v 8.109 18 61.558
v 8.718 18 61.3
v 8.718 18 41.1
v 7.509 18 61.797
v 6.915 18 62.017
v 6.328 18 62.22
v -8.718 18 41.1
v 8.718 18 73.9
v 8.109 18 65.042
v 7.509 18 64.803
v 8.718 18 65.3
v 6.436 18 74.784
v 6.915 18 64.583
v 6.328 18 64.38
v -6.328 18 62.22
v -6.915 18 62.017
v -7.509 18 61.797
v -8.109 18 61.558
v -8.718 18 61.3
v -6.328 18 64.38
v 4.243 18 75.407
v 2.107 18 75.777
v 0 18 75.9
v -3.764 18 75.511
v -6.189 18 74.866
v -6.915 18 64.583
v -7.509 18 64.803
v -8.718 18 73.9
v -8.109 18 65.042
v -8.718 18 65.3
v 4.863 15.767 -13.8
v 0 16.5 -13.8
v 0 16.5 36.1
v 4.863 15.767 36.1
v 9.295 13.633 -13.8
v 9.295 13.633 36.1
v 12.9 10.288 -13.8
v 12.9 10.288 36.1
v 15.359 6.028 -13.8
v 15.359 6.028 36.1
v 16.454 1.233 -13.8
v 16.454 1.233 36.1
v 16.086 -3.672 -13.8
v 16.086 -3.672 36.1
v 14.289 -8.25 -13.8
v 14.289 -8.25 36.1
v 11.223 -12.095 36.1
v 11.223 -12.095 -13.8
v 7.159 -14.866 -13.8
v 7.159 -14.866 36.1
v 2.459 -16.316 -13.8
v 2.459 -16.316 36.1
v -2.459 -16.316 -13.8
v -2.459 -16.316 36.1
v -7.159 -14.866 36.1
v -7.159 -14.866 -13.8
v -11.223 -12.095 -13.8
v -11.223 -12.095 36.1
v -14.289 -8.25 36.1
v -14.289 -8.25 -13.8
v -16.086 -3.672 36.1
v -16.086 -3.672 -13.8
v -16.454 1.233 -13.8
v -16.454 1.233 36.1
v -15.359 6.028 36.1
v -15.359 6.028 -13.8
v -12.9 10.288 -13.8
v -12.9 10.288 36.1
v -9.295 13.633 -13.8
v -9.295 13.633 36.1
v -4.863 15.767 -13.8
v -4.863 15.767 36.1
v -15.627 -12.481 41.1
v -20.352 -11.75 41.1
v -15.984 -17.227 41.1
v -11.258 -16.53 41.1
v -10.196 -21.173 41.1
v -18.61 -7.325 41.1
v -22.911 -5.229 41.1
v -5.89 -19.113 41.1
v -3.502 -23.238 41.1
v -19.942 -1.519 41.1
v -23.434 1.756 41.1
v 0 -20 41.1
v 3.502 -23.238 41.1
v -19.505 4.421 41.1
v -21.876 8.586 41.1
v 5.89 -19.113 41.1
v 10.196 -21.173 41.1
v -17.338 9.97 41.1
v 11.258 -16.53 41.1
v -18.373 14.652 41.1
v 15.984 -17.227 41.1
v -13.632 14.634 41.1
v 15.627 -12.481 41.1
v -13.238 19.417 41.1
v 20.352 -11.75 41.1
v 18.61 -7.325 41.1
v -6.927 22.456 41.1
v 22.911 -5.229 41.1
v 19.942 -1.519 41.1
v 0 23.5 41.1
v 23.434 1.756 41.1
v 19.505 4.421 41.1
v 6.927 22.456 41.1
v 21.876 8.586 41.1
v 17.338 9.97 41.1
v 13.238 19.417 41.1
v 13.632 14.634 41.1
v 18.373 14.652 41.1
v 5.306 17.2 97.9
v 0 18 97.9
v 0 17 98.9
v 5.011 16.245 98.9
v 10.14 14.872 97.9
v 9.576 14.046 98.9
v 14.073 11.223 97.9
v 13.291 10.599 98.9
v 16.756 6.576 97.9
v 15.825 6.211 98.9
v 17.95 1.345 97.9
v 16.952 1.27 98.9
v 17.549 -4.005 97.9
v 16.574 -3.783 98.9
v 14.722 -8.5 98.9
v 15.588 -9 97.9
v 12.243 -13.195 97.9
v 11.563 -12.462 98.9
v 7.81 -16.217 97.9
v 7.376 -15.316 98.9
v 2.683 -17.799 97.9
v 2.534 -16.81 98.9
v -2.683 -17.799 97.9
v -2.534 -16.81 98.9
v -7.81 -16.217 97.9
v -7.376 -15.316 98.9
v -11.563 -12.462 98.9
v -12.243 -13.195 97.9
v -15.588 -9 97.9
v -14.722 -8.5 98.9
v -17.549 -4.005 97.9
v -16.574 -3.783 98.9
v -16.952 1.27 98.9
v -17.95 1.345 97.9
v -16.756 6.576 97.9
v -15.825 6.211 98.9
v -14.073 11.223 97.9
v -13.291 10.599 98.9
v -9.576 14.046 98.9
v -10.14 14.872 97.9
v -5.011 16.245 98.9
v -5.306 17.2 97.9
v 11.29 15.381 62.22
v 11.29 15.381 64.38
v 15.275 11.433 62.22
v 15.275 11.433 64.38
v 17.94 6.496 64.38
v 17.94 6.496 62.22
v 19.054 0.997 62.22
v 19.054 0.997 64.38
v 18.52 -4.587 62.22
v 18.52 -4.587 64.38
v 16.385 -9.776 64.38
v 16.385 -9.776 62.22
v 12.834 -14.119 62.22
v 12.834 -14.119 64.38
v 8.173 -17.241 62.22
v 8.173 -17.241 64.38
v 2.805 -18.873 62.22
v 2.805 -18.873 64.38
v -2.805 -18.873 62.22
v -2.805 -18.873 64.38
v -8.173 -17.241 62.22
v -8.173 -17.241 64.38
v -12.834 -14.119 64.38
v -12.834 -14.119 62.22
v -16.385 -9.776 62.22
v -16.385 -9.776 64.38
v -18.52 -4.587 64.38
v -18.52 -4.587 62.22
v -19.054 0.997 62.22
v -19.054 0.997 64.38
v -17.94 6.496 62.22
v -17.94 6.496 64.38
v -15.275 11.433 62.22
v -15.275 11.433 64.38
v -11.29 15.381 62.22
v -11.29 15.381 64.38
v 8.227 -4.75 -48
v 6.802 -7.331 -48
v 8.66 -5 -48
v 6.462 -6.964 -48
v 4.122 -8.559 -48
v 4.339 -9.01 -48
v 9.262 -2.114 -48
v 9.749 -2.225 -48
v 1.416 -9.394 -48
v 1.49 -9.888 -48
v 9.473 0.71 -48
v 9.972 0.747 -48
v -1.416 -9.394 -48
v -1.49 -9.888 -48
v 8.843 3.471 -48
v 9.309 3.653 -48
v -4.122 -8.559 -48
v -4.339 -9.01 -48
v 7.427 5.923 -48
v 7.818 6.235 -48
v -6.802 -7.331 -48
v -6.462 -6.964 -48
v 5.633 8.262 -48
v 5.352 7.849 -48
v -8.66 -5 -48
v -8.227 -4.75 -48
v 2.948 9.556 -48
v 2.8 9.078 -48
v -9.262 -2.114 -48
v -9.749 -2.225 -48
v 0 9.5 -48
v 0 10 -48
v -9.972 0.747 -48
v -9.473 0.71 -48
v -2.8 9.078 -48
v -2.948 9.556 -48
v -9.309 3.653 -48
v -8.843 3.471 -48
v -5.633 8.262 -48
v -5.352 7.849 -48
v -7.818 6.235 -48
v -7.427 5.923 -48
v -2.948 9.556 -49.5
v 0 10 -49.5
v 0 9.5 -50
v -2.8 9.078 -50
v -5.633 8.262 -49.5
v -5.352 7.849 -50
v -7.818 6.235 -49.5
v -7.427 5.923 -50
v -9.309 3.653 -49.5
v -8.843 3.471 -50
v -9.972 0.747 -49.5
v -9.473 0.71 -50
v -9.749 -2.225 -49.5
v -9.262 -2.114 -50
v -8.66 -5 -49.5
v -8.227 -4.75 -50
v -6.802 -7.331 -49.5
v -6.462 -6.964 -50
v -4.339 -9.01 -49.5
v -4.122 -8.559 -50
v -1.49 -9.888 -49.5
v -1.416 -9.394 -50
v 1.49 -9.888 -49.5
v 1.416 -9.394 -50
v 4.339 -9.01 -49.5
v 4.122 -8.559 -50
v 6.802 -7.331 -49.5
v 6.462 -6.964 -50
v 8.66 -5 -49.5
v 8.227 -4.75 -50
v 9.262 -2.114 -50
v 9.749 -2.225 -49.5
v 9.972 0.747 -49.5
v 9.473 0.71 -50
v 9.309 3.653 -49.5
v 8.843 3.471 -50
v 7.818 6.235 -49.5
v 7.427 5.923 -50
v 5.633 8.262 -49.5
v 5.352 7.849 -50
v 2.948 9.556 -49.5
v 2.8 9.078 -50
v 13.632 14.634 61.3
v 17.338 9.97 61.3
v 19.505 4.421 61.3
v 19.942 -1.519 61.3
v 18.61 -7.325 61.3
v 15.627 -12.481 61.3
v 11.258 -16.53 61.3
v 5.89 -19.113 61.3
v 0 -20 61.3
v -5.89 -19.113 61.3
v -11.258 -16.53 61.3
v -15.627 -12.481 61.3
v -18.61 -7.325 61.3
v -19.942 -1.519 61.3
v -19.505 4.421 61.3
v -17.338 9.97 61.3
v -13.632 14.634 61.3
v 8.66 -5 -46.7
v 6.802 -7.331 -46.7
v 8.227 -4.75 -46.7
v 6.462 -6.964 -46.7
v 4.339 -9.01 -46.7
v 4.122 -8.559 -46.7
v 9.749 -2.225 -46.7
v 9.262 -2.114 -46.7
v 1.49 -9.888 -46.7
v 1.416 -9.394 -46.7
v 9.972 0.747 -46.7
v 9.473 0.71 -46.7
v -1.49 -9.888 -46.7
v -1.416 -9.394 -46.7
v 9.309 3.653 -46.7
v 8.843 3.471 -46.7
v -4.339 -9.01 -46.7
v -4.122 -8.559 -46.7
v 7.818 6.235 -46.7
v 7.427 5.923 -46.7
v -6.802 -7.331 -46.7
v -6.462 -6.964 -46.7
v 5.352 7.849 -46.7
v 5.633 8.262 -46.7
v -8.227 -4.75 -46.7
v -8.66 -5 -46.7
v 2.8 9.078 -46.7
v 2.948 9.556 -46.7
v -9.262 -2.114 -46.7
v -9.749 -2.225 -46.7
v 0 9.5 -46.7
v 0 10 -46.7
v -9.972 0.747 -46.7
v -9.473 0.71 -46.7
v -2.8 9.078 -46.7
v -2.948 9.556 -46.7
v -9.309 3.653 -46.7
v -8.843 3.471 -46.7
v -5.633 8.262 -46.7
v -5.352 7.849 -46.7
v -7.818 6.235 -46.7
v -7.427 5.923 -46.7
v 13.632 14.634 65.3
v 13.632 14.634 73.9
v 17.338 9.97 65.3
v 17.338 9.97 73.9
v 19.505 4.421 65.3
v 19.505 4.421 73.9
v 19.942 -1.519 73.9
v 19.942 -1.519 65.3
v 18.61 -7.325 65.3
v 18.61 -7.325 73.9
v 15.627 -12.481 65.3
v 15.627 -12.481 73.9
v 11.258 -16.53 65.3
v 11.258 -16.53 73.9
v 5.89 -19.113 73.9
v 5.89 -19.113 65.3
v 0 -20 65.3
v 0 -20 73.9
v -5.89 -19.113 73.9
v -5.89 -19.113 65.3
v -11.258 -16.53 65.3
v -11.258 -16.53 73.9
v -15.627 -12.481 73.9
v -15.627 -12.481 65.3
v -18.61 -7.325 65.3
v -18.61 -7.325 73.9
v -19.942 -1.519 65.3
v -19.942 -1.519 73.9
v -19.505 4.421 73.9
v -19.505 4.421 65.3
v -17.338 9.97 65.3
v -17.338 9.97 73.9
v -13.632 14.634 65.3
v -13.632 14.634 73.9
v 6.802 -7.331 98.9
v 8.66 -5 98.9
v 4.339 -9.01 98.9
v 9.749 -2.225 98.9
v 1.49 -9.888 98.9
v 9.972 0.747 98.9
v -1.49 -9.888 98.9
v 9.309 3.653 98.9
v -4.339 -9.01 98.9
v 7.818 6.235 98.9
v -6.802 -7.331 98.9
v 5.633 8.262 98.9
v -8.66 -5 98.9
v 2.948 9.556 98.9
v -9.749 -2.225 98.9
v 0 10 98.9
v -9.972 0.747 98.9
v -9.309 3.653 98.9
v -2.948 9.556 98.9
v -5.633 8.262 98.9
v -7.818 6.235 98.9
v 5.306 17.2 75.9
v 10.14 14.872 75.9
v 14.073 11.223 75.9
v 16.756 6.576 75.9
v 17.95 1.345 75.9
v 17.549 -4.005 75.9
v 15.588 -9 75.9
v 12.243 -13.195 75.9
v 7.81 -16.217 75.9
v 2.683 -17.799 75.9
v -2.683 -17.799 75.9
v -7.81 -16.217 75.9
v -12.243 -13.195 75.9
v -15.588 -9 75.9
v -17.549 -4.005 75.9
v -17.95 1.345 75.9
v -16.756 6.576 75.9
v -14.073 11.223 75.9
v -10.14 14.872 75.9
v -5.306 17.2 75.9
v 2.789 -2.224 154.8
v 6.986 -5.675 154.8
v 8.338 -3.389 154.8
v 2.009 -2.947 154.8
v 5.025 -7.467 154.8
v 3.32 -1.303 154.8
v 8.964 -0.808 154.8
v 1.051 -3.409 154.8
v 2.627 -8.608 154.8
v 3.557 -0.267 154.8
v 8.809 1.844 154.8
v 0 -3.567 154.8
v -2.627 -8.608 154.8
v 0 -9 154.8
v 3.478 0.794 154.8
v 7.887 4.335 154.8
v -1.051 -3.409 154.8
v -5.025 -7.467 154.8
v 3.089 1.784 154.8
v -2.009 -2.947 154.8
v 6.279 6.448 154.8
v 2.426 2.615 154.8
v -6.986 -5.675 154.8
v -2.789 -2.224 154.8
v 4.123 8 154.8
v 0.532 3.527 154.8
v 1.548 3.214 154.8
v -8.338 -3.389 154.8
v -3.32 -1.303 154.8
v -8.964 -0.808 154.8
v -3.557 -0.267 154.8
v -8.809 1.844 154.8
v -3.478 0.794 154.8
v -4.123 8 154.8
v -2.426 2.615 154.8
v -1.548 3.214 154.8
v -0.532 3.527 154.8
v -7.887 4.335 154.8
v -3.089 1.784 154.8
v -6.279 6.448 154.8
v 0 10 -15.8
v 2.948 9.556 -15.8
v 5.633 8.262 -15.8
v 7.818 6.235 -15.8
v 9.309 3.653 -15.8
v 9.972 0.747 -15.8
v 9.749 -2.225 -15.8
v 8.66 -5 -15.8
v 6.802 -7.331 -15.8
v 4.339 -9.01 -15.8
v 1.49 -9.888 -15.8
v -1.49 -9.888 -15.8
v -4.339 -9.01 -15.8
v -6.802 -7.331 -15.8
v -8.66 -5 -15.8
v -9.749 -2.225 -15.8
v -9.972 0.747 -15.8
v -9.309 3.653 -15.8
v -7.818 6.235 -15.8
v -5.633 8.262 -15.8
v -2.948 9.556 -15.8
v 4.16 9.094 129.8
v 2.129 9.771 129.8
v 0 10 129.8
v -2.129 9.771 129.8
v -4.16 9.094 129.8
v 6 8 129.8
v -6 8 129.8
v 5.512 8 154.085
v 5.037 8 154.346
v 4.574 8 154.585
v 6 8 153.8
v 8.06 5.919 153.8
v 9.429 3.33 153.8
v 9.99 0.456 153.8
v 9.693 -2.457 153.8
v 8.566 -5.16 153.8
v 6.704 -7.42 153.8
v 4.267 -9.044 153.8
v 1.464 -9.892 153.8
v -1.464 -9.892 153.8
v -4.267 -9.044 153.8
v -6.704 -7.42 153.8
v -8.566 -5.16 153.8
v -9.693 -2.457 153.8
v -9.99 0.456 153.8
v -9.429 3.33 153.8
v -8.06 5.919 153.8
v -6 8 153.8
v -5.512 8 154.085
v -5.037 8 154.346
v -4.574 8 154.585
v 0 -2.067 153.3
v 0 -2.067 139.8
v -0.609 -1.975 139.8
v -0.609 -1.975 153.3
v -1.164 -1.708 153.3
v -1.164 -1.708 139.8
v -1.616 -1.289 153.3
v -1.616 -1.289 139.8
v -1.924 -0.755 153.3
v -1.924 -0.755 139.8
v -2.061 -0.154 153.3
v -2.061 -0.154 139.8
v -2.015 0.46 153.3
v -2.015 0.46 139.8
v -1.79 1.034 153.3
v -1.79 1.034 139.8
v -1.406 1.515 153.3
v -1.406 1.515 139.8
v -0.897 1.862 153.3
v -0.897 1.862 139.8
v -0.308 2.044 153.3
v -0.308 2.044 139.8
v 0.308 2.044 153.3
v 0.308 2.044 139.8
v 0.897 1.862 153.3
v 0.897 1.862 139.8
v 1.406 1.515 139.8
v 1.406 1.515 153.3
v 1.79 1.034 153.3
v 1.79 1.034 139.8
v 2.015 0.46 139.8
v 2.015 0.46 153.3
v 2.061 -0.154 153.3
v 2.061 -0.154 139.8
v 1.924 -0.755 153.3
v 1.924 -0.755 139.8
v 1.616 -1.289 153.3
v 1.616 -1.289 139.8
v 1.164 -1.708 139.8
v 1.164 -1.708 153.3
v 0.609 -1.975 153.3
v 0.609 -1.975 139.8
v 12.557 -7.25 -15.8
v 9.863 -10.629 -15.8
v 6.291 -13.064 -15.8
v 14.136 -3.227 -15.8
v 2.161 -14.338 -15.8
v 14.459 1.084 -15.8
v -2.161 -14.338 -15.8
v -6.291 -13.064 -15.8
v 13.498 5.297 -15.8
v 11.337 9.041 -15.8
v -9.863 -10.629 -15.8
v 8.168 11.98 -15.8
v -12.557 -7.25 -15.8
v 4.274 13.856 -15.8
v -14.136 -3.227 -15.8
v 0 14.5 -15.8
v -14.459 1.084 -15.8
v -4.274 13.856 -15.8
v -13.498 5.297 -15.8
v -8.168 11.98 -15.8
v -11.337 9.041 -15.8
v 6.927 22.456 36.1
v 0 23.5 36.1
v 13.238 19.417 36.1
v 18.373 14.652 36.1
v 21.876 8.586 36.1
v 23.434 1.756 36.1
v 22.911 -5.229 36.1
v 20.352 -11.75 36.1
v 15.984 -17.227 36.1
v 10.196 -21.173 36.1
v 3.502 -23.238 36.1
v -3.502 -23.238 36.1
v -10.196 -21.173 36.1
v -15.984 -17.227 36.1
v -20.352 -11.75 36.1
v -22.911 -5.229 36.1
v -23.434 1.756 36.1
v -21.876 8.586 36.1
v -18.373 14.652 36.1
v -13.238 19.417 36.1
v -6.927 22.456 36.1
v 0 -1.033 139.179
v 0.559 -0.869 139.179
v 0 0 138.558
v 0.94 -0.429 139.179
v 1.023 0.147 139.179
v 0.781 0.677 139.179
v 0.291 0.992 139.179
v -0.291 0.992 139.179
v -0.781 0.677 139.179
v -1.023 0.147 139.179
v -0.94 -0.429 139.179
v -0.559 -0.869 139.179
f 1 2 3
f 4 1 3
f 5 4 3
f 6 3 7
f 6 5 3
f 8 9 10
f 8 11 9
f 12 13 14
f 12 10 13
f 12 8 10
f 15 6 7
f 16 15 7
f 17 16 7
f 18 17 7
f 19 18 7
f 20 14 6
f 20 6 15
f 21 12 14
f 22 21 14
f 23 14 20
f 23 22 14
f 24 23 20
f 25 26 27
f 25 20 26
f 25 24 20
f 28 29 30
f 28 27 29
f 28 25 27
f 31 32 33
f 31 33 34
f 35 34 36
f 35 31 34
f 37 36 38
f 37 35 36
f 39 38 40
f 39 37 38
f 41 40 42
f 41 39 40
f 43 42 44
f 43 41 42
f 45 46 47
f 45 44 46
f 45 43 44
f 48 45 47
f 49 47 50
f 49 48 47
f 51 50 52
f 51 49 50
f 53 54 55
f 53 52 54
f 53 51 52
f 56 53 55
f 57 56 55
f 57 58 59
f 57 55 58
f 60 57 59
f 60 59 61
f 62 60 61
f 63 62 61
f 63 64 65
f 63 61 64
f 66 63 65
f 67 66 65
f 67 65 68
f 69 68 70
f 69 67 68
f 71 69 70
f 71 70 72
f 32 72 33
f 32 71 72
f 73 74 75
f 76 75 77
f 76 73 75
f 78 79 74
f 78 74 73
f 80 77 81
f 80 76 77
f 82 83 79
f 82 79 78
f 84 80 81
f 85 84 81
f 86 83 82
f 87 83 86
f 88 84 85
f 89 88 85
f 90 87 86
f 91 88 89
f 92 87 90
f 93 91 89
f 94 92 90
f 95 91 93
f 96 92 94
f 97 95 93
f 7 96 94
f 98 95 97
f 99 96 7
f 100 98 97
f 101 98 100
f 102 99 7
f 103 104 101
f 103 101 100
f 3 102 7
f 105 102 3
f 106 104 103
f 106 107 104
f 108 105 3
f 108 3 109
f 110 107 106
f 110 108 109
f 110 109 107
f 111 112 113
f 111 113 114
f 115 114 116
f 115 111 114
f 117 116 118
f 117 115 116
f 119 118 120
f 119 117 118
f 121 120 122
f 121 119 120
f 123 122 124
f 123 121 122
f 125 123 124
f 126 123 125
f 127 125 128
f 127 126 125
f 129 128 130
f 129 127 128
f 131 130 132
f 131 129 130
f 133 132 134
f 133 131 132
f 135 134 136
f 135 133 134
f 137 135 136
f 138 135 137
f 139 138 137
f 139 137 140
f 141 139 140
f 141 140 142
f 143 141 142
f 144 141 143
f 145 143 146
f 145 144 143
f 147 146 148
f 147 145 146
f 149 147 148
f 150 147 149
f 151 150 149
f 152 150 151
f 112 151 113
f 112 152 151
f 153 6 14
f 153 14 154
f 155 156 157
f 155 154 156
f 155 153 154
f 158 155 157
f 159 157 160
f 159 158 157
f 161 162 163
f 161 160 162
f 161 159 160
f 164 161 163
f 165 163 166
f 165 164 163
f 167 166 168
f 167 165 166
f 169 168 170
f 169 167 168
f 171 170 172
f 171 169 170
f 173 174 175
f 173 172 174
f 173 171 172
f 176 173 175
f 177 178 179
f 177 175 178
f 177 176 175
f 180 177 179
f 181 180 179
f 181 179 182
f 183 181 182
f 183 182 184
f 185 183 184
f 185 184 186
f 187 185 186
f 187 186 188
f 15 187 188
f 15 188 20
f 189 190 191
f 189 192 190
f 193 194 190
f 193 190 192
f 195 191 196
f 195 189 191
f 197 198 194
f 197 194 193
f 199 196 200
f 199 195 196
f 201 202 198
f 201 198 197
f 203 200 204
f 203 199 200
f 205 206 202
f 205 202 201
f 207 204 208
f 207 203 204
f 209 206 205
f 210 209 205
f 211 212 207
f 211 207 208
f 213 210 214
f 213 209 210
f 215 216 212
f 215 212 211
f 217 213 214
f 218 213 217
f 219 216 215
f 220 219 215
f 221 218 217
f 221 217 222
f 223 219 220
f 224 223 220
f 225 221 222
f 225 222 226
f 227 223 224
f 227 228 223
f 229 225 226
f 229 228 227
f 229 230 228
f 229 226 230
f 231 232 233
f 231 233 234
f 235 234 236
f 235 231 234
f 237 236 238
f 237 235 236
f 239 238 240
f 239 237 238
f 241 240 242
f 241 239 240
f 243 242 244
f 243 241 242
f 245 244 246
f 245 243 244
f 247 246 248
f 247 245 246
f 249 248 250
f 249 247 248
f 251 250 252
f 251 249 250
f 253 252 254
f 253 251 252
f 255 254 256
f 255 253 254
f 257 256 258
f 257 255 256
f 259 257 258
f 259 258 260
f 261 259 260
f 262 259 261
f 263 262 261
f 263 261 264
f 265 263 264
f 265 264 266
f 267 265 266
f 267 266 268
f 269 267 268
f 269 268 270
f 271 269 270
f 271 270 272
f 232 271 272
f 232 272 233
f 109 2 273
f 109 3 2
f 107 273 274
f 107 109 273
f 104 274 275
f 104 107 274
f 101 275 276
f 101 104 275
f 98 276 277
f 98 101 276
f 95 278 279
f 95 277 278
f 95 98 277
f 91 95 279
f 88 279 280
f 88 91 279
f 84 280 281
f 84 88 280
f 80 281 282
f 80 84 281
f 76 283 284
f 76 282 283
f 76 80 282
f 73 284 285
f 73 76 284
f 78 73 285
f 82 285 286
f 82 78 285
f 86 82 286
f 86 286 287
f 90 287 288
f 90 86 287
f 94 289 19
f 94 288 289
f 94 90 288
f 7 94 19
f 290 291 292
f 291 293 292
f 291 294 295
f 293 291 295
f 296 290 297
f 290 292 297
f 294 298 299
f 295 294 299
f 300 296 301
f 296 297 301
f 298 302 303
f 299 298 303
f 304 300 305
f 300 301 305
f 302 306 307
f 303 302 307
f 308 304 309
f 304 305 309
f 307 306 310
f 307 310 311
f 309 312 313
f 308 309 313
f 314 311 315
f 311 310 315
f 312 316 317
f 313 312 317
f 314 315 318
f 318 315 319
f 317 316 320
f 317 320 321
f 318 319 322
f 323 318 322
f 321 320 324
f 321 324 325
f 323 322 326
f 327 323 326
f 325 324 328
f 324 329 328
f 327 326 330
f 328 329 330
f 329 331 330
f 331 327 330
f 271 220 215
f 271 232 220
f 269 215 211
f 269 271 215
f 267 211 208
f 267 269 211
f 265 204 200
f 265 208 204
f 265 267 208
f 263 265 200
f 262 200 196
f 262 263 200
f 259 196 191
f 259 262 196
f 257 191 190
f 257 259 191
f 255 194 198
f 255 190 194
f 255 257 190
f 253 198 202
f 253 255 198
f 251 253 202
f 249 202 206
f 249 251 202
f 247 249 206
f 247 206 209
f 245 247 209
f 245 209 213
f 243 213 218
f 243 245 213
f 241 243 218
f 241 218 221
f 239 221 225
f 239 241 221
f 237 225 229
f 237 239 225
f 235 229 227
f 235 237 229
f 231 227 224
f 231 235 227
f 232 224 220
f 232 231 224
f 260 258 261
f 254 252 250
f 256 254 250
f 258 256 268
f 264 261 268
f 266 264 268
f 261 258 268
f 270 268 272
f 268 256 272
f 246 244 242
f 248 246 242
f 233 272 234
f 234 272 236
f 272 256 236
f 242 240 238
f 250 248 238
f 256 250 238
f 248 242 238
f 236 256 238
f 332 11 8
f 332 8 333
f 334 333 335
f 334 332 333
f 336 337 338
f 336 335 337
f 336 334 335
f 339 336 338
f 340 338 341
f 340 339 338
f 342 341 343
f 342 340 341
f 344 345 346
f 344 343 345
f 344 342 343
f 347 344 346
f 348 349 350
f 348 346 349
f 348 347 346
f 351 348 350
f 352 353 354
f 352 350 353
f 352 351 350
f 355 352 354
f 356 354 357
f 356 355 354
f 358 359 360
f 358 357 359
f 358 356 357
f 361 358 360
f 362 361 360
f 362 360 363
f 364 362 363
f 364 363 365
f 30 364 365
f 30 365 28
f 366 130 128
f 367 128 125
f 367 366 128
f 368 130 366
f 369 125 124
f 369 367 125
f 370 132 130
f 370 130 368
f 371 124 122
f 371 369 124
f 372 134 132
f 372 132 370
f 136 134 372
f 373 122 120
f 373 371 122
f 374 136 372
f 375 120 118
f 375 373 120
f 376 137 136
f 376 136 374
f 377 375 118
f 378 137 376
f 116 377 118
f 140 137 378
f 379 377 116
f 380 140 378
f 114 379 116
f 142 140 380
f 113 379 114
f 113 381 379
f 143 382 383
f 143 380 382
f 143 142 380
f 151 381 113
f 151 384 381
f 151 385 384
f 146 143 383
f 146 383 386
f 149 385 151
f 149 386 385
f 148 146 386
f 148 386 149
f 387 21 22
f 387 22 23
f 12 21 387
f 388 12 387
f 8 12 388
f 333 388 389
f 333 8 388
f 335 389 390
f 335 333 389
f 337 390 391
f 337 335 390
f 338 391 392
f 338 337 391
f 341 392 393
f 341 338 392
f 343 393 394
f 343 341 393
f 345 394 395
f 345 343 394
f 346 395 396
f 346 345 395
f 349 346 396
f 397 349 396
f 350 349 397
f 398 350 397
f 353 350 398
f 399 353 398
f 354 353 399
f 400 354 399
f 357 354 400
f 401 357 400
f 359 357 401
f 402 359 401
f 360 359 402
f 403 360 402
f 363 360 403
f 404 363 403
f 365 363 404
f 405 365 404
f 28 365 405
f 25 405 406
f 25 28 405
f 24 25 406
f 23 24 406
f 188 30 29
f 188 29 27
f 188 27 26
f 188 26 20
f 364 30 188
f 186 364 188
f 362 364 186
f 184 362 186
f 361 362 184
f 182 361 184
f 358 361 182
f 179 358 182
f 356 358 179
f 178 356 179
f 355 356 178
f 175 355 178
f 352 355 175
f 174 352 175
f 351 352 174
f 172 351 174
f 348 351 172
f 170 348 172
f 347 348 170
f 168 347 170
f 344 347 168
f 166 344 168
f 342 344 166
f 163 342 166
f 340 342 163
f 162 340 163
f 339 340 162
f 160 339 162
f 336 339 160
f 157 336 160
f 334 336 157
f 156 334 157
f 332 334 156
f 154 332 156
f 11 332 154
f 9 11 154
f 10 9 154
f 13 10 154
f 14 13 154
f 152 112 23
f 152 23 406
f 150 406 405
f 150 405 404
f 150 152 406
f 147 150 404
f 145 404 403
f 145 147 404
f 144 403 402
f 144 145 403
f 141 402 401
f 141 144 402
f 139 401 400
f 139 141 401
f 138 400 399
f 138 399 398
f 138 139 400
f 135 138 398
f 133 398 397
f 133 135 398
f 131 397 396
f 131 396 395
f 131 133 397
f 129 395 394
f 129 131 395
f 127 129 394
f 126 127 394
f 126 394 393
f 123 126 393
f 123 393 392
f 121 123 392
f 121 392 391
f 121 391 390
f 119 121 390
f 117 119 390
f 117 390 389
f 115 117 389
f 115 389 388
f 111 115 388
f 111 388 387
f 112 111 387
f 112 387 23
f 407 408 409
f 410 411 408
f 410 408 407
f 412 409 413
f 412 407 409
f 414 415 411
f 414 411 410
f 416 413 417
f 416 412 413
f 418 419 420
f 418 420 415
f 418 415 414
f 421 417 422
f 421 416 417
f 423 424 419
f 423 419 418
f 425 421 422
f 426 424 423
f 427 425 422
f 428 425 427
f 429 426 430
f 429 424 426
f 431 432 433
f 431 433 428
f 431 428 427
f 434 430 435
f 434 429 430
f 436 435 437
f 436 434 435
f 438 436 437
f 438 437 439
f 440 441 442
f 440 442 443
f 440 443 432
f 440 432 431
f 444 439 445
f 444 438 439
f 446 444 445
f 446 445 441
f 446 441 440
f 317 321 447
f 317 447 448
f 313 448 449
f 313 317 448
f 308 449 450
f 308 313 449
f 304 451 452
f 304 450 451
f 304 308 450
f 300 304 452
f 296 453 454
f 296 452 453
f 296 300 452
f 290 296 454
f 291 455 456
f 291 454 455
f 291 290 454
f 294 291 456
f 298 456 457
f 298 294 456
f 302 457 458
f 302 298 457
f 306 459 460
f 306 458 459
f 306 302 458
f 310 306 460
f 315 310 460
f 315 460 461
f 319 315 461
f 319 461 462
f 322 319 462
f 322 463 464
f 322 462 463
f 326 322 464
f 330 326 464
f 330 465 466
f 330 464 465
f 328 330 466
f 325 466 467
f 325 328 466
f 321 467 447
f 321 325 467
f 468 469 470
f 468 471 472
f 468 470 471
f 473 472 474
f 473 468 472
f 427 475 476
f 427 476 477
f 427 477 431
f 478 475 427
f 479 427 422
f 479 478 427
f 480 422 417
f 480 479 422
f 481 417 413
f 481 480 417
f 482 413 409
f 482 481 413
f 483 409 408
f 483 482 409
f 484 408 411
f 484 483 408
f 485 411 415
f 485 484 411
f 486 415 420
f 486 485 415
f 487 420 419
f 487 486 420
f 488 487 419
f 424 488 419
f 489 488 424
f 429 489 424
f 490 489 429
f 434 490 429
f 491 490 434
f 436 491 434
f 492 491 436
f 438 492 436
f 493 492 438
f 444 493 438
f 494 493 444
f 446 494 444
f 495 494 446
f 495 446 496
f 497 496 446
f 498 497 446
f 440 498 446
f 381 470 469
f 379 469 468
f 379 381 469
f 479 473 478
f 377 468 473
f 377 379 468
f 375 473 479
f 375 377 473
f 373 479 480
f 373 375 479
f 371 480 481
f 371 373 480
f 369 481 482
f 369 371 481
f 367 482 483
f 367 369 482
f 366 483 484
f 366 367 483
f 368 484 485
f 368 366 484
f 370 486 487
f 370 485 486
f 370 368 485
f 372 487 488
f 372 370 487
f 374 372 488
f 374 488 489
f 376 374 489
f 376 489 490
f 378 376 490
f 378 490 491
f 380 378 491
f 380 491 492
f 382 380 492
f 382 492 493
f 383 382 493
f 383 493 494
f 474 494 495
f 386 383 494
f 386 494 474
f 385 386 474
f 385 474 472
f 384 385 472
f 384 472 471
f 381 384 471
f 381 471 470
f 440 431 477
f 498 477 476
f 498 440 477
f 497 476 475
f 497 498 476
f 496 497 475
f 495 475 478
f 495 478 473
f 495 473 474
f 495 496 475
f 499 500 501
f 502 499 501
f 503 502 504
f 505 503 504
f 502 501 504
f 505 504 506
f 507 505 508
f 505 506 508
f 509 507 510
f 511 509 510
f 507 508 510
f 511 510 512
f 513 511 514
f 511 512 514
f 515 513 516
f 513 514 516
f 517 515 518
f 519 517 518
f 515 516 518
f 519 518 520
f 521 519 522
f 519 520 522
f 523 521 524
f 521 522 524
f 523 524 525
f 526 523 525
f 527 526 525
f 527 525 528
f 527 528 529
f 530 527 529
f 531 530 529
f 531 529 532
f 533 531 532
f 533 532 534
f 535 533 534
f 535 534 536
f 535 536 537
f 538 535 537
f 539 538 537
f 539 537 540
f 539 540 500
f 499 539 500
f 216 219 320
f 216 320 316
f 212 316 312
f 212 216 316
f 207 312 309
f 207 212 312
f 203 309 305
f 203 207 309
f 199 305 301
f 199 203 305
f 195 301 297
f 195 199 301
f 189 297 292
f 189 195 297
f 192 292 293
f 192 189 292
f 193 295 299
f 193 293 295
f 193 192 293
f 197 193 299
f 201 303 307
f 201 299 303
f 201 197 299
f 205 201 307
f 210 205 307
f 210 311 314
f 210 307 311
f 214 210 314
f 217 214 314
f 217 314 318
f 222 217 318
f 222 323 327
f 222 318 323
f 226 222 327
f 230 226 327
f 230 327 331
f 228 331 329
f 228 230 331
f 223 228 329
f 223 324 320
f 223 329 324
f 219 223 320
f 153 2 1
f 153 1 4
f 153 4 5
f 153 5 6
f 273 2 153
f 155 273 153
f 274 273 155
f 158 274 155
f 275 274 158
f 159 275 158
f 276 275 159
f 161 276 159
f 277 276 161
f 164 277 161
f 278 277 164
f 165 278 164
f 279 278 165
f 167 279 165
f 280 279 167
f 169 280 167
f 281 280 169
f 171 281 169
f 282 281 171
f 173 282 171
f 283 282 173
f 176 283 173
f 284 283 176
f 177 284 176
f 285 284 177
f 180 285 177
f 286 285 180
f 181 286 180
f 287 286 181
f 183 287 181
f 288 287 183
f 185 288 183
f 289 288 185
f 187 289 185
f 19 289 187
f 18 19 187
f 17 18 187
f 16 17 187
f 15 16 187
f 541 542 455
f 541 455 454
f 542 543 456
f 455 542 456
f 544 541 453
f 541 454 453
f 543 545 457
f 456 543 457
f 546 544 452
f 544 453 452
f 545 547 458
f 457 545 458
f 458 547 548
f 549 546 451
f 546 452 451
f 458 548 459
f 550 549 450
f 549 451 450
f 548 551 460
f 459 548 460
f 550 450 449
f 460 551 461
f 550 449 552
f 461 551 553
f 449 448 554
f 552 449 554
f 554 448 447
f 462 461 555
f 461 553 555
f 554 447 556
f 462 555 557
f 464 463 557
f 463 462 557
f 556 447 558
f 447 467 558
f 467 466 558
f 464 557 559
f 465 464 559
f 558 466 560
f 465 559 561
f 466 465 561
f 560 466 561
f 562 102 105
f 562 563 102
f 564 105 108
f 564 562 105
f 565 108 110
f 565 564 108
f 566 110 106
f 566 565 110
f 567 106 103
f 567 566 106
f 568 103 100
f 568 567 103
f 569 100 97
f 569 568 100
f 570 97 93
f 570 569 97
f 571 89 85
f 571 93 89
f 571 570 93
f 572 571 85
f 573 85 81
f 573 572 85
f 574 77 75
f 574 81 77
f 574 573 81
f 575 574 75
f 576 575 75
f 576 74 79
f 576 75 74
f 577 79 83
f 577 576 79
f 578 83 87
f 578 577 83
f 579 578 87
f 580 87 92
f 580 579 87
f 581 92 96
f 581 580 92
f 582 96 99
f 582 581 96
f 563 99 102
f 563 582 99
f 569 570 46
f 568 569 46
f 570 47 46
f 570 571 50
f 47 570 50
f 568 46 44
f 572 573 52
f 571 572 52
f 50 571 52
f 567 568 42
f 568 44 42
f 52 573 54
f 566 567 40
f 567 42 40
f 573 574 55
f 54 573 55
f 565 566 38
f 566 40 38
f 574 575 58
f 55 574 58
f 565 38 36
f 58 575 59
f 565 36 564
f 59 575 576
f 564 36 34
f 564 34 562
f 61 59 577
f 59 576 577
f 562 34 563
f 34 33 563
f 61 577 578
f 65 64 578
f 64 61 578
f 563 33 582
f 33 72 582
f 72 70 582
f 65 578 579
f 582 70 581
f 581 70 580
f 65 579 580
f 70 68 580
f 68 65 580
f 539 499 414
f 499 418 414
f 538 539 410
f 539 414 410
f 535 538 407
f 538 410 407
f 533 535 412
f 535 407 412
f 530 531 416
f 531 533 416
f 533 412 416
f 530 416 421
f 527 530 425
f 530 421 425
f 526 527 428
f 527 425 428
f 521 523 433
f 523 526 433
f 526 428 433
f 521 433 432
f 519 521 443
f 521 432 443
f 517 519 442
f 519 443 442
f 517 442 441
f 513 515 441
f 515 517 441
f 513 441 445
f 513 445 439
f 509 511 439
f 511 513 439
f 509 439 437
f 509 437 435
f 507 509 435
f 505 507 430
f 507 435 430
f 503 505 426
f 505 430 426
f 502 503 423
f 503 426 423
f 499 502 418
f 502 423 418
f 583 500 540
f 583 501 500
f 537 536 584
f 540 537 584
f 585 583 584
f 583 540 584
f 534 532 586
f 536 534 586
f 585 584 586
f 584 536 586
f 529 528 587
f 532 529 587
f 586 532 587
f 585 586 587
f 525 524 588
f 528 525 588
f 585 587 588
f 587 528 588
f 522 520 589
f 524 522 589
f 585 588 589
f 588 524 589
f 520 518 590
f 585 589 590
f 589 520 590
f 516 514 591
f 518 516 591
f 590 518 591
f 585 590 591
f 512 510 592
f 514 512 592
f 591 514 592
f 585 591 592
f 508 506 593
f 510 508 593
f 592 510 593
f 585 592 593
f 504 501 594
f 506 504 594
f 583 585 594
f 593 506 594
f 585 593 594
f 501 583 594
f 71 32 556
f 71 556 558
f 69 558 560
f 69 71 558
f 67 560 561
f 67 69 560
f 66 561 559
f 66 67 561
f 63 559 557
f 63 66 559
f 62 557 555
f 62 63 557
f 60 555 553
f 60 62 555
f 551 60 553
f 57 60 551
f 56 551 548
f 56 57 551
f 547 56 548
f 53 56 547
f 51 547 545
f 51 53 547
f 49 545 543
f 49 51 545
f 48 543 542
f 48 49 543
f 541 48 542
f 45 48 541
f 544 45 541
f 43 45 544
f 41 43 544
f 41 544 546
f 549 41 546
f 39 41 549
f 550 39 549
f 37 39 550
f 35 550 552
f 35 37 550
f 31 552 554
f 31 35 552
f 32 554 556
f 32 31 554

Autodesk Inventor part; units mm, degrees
ref_plane "YZ Plane" through (0, 0, 0) normal (1, 0, 0) x (0, 1, 0)
ref_plane "XY Plane" through (0, 0, 0) normal (0, 0, 1) x (1, 0, 0)
sketch "Skizze1" plane through (0, 0, 0) normal (1, 0, 0) x (0, 1, 0)
  line L0 (0, 154.8) -> (9, 154.8)
  line L1 (9, 154.8) -> (10, 153.8)
  line L2 (10, 153.8) -> (10, 98.9)
  line L3 (18, 75.9) -> (20, 73.9)
  line L4 (20, 73.9) -> (20, 65.3)
  line L5 (20, 61.3) -> (20, 41.1)
  line L6 (20, 41.1) -> (23.5, 41.1)
  line L7 (23.5, 41.1) -> (23.5, 36.1)
  line L8 (23.5, 36.1) -> (16.5, 36.1)
  line L9 (16.5, 36.1) -> (16.5, -13.8)
  line L10 (10, -15.8) -> (10, -46.7)
  line L11 (10, -46.7) -> (9.5, -46.7)
  line L12 (9.5, -46.7) -> (9.5, -48)
  line L13 (9.5, -48) -> (10, -48)
  line L14 (10, -48) -> (10, -49.5)
  line L15 (10, -49.5) -> (9.5, -50)
  line L16 (9.5, -50) -> (0, -50)
  line L17 (0, -50) -> (0, 154.8)
  line L18 (14.5, -15.8) -> (10, -15.8)
  line L19 (16.5, -13.8) -> (14.5, -15.8)
  line L20 (0, 195.76) -> (0, -90.96) construction
  line L21 (-4.7, 0) -> (28.2, 0) construction
  line L22 (10, 98.9) -> (0, 98.9) construction
  line L23 (10, -15.8) -> (0, -15.8) construction
  line L24 (10, -46.7) -> (0, -46.7) construction
  line L25 (17, 98.9) -> (10, 98.9)
  line L26 (18, 75.9) -> (18, 97.9)
  line L27 (18, 97.9) -> (17, 98.9)
  line L28 (10, 129.8) -> (0, 129.8) construction
  circle A0 centre (20, 63.3) radius 2 construction
  line L29 (20, 65.3) -> (19.0799, 64.3799)
  line L30 (19.0799, 64.3799) -> (19.0799, 62.2201)
  line L31 (19.0799, 62.2201) -> (20, 61.3)
  line L32 (20, 63.3) -> (19.0799, 63.3) construction
  line L33 (18, 75.9) -> (18, 75.9)
  point P0 (0, 0)
  point P1 (18, 98.9)
  dimension "d4" = 45
  dimension "d6" = 1.3
  dimension "d9" = 23.5
  dimension "d11" = 5
  dimension "d19" = 45
  dimension "d21" = 2
  dimension "d22" = 1
  dimension "d34" = 0
  dimension "d35" = 50
  dimension "d36" = 45
  dimension "d87" = 114.7
  dimension "d88" = 0
  dimension "d89" = 30.9
  dimension "d90" = 19
  dimension "d91" = 20
  dimension "d119" = 20
  dimension "d120" = 1.5
  dimension "d122" = 1
  dimension "d123" = 1
  dimension "d124" = 33
  dimension "d125" = 40
  dimension "d126" = 30.9
  dimension "d127" = 25
  dimension "d135" = 78.9
  dimension "d139" = 91.5
  dimension "d140" = 113.7
  dimension "d141" = 22.2
  dimension "d142" = 45
  dimension "d143" = 45
  dimension "d144" = 38.1598
  dimension "d145" = 8.6
  dimension "d157" = 36
  dimension "d158" = 2
revolve "Umdrehung1" add sketch "Skizze1" angle 360 about axis through (0, 0, -50) along (0, 0, 1)
ref_plane "Wellennuttiefe_Arbeitsebene" through (0, 15, 51.2) normal (0, 1, 0) x (-1, 0, 0)
ref_plane "Arbeitsebene1" through (0, 20, 51.2) normal (0, 1, 0) x (-1, 0, 0)
sketch "Skizze2" plane through (0, 20, 51.2) normal (0, 1, 0) x (-1, 0, 0)
  line L0 (-23.5, -10.1) -> (23.5, -10.1) construction
  line L1 (0, 144.56) -> (0, -142.16) construction
  line L2 (20, 10.1) -> (20, -10.1) construction
  line L3 (-20, 10.1) -> (-20, -10.1) construction
  line L4 (-19.0799, 11.0201) -> (19.0799, 11.0201) construction
  line L5 (20, -10.1) -> (-20, -10.1)
  line L6 (-20, -10.1) -> (-20, 47.7)
  line L7 (-20, 47.7) -> (20, 47.7)
  line L8 (20, 47.7) -> (20, -10.1)
  line L9 (-16.5, 24.7) -> (16.5, 24.7) construction
  line L10 (-17, 47.7) -> (17, 47.7) construction
  point P0 (0, -51.2)
extrude "Passfeder_Ausnahme" cut sketch "Skizze2" against normal blind 2
thread "Gewinde1" size "M40x1.5" class "6g" standard "ISO Metric profile" full length
ref_plane "Arbeitsebene5" through (0, 10, 126.35) normal (0, 1, 0) x (-1, 0, 0)
sketch "Skizze7" plane through (0, 10, 126.35) normal (0, 1, 0) x (-1, 0, 0)
  line L0 (-10, -27.45) -> (10, -27.45) construction
  line L1 (10, 3.45) -> (-10, 3.45) construction
  line L2 (-10, -27.45) -> (10, -27.45) construction
  line L3 (0, -27.45) -> (0, 3.45) construction
  line L4 (10, 27.45) -> (10, -27.45) construction
  line L5 (-10, 27.45) -> (-10, -27.45) construction
  line L6 (-9, 28.45) -> (9, 28.45) construction
  line L7 (-17, -27.45) -> (17, -27.45) construction
  line L8 (0, 28.45) -> (0, 3.45) construction
  line L9 (10, 3.45) -> (-10, 3.45)
  line L10 (-10, 3.45) -> (-10, 28.45)
  line L11 (-10, 28.45) -> (10, 28.45)
  line L12 (10, 28.45) -> (10, 3.45)
  point P0 (0, -126.35)
  dimension "d100" = 30.9
  dimension "Flansch_Max_Connector_Lenght" = 25
ref_plane "Wellennuttiefe_Arbeitsebene_2" through (0, 6.5, 126.35) normal (0, 1, 0) x (-1, 0, 0)
extrude "Flachstelle_Flansch" cut sketch "Skizze7" against normal blind 2
sketch "Skizze9" plane through (0, 0, 154.8) normal (0, 0, 1) x (1, 0, 0)
  circle A0 centre (0, 0) radius 9 construction
  point P0 (0, 0)
hole "Bohrung1" at (0, 0, 154.8) direction (0, 0, -1) diameter 4.134 depth 15 tip angle 118 thread size "M5x0.8" class "6H" standard "ISO Metric profile"
chamfer "Fase4" distance 1.5 angle 45 1 edges at (0, 2.067, 154.8)
sketch "Skizze11" plane through (-25.5, 0, 153.8) normal (0, 0, 1) x (1, 0, 0)
  arc A0 (0, 0) -> (51, 0) centre (25.5, 0) ccw projected
  circle A1 centre (25.5, 0) radius 23.5 projected
  line L0 (0, -25.5) -> (51, -25.5)
  line L1 (51, -25.5) -> (51, 0)
  line L2 (0, -25.5) -> (0, 0)
  point P0 (25.5, 0)
  point P1 (25.5, -25.5)
sketch "Skizze12" plane through (0, 0, 153.8) normal (0, 0, 1) x (1, 0, 0)
  circle A0 centre (0, 0) radius 16.5 projected
  circle A1 centre (0, 0) radius 16.5 projected
  line L0 (-25.5, -25.5) -> (25.5, -25.5) projected
  line L1 (-10, 0) -> (-25.5, 0) projected
  line L2 (-25.5, 0) -> (-25.5, -25.5) projected
  line L3 (-25.5, -25.5) -> (25.5, -25.5) projected
  line L4 (25.5, -25.5) -> (25.5, 0) projected
  line L5 (10, 0) -> (25.5, 0) projected
  arc A2 (-10, 0) -> (10, 0) centre (0, 0) ccw projected
  circle A3 centre (0, 0) radius 15.7
  line L6 (-17, 0) -> (-10, 0) projected
  line L7 (-15.7, 0) -> (-15.7, -25.5)
  line L8 (-25.5, -25.5) -> (25.5, -25.5) projected
  line L9 (10, 0) -> (25.5, 0) projected
  line L10 (15.7, 0) -> (15.7, -25.5)
  point P0 (0, 0)
  point P1 (25.5, -25.5)
  point P2 (15.7, 0)
  point P3 (-15.7, 0)
  dimension "d155" = 0.8
sketch "Skizze10" plane through (0, 0, 0) normal (1, 0, 0) x (0, 1, 0)
  line L0 (-18, 75.9) -> (-18, 97.9) projected
  line L1 (-18, 97.9) -> (-17, 98.9) projected
  line L2 (-17, 98.9) -> (-10, 98.9) projected
  line L3 (-10, 98.9) -> (-10, 153.8) projected
  line L4 (-10, 153.8) -> (-9, 154.8) projected
  line L5 (-9, 154.8) -> (-3.567, 154.8) projected
  line L6 (-3.567, 154.8) -> (-2.067, 153.3) projected
  line L7 (-2.067, 153.3) -> (-2.067, 139.8) projected
  line L8 (-2.067, 139.8) -> (0, 138.558) projected
  line L9 (0, 138.558) -> (2.067, 139.8) projected
  line L10 (2.067, 139.8) -> (2.067, 153.3) projected
  line L11 (2.067, 153.3) -> (3.567, 154.8) projected
  line L12 (3.567, 154.8) -> (6.5, 154.8) projected
  line L13 (6.5, 154.8) -> (6.5, 129.8) projected
  line L14 (6.5, 129.8) -> (10, 129.8) projected
  line L15 (10, 129.8) -> (10, 98.9) projected
  line L16 (10, 98.9) -> (17, 98.9) projected
  line L17 (17, 98.9) -> (18, 97.9) projected
  line L18 (18, 97.9) -> (18, 75.9) projected
  line L19 (18, 75.9) -> (20, 73.9) projected
  line L20 (20, 73.9) -> (20, 65.3) projected
  line L21 (20, 65.3) -> (19.0799, 64.3799) projected
  line L22 (19.0799, 64.3799) -> (19.0799, 62.2201) projected
  line L23 (19.0799, 62.2201) -> (15, 62.2201) projected
  line L24 (15, 62.2201) -> (15, 41.1) projected
  line L25 (15, 41.1) -> (23.5, 41.1) projected
  line L26 (23.5, 41.1) -> (23.5, 36.1) projected
  line L27 (23.5, 36.1) -> (16.5, 36.1) projected
  line L28 (16.5, 36.1) -> (16.5, -13.8) projected
  line L29 (16.5, -13.8) -> (14.5, -15.8) projected
  line L30 (14.5, -15.8) -> (10, -15.8) projected
  line L31 (10, -15.8) -> (10, -46.7) projected
  line L32 (10, -46.7) -> (9.5, -46.7) projected
  line L33 (9.5, -46.7) -> (9.5, -48) projected
  line L34 (9.5, -48) -> (10, -48) projected
  line L35 (10, -48) -> (10, -49.5) projected
  line L36 (10, -49.5) -> (9.5, -50) projected
  line L37 (9.5, -50) -> (-9.5, -50) projected
  line L38 (-9.5, -50) -> (-10, -49.5) projected
  line L39 (-10, -49.5) -> (-10, -48) projected
  line L40 (-10, -48) -> (-9.5, -48) projected
  line L41 (-9.5, -48) -> (-9.5, -46.7) projected
  line L42 (-9.5, -46.7) -> (-10, -46.7) projected
  line L43 (-10, -46.7) -> (-10, -15.8) projected
  line L44 (-10, -15.8) -> (-14.5, -15.8) projected
  line L45 (-14.5, -15.8) -> (-16.5, -13.8) projected
  line L46 (-16.5, -13.8) -> (-16.5, 36.1) projected
  line L47 (-16.5, 36.1) -> (-23.5, 36.1) projected
  line L48 (-23.5, 36.1) -> (-23.5, 41.1) projected
  line L49 (-23.5, 41.1) -> (-20, 41.1) projected
  line L50 (-20, 41.1) -> (-20, 61.3) projected
  line L51 (-20, 61.3) -> (-19.0799, 62.2201) projected
  line L52 (-19.0799, 62.2201) -> (-19.0799, 64.3799) projected
  line L53 (-19.0799, 64.3799) -> (-20, 65.3) projected
  line L54 (-20, 65.3) -> (-20, 73.9) projected
  line L55 (-20, 73.9) -> (-18, 75.9) projected
  line L56 (-10, 153.8) -> (6.5, 153.8) projected
  line L57 (-10, 153.8) -> (-25.5, 153.8)
  line L58 (-25.5, 153.8) -> (-25.5, -13.8)
  line L59 (-16.5, 36.1) -> (-16.5, -13.8) projected
  line L60 (0, -90.96) -> (0, 195.76) projected
  line L61 (-20, 61.3) -> (-20, 41.1) projected
  line L62 (-25.5, -13.8) -> (-16.5, -13.8)
  point P0 (0, 0)
  point P1 (2.567, 153.8)
  point P2 (-2.567, 153.8)
  dimension "d154" = 2
equation "\"d100\" = MainAxis_Bearing_Fix2ScrewLimit_Dist + MainAxis_Bearing_Fix2Limit_Dist"
equation "\"d6\" = Sprengring_NutBreite"
equation "\"d87\" = -MainAxis_Bearing_Fix2ScrewLimit_Dist + Gestell_Lager_Distanz - MainAxis_Bearing_Fix2Limit_Dist"
equation "\"d89\" = MainAxis_Bearing_Fix2Limit_Dist + MainAxis_Bearing_Fix2ScrewLimit_Dist"
equation "\"d90\" = Sprengring_NutDurchmesser"
equation "\"d91\" = P204_ShaftDiameter"
equation "\"d119\" = P204_ShaftDiameter"
equation "\"Wellennuttiefe_20\" = 3.5"
equation "\"Nabennuttiefe_20\" = 2.8"
equation "\"Sprengring_NutBreite\" = 1.3"
equation "\"Sprengring_NutDurchmesser\" = 19"
equation "\"Nabennuttiefe_40\" = 3.3"
equation "\"Wellennuttiefe_40\" = 5"
equation "\"Passfeder_Width_20\" = 6"
equation "\"Passfeder_Width_40\" = 12"
equation "\"MainAxis_Bearing_Fix2ScrewLimit_Dist\" = 23.4"
equation "\"MainAxis_Bearing_Fix2Limit_Dist\" = 7.5"
equation "\"Gestell_Lager_Distanz\" = 145.6"
equation "\"P204_ShaftDiameter\" = 20"
properties part number "Welle_Flachstelle" material "Edelstahl"
